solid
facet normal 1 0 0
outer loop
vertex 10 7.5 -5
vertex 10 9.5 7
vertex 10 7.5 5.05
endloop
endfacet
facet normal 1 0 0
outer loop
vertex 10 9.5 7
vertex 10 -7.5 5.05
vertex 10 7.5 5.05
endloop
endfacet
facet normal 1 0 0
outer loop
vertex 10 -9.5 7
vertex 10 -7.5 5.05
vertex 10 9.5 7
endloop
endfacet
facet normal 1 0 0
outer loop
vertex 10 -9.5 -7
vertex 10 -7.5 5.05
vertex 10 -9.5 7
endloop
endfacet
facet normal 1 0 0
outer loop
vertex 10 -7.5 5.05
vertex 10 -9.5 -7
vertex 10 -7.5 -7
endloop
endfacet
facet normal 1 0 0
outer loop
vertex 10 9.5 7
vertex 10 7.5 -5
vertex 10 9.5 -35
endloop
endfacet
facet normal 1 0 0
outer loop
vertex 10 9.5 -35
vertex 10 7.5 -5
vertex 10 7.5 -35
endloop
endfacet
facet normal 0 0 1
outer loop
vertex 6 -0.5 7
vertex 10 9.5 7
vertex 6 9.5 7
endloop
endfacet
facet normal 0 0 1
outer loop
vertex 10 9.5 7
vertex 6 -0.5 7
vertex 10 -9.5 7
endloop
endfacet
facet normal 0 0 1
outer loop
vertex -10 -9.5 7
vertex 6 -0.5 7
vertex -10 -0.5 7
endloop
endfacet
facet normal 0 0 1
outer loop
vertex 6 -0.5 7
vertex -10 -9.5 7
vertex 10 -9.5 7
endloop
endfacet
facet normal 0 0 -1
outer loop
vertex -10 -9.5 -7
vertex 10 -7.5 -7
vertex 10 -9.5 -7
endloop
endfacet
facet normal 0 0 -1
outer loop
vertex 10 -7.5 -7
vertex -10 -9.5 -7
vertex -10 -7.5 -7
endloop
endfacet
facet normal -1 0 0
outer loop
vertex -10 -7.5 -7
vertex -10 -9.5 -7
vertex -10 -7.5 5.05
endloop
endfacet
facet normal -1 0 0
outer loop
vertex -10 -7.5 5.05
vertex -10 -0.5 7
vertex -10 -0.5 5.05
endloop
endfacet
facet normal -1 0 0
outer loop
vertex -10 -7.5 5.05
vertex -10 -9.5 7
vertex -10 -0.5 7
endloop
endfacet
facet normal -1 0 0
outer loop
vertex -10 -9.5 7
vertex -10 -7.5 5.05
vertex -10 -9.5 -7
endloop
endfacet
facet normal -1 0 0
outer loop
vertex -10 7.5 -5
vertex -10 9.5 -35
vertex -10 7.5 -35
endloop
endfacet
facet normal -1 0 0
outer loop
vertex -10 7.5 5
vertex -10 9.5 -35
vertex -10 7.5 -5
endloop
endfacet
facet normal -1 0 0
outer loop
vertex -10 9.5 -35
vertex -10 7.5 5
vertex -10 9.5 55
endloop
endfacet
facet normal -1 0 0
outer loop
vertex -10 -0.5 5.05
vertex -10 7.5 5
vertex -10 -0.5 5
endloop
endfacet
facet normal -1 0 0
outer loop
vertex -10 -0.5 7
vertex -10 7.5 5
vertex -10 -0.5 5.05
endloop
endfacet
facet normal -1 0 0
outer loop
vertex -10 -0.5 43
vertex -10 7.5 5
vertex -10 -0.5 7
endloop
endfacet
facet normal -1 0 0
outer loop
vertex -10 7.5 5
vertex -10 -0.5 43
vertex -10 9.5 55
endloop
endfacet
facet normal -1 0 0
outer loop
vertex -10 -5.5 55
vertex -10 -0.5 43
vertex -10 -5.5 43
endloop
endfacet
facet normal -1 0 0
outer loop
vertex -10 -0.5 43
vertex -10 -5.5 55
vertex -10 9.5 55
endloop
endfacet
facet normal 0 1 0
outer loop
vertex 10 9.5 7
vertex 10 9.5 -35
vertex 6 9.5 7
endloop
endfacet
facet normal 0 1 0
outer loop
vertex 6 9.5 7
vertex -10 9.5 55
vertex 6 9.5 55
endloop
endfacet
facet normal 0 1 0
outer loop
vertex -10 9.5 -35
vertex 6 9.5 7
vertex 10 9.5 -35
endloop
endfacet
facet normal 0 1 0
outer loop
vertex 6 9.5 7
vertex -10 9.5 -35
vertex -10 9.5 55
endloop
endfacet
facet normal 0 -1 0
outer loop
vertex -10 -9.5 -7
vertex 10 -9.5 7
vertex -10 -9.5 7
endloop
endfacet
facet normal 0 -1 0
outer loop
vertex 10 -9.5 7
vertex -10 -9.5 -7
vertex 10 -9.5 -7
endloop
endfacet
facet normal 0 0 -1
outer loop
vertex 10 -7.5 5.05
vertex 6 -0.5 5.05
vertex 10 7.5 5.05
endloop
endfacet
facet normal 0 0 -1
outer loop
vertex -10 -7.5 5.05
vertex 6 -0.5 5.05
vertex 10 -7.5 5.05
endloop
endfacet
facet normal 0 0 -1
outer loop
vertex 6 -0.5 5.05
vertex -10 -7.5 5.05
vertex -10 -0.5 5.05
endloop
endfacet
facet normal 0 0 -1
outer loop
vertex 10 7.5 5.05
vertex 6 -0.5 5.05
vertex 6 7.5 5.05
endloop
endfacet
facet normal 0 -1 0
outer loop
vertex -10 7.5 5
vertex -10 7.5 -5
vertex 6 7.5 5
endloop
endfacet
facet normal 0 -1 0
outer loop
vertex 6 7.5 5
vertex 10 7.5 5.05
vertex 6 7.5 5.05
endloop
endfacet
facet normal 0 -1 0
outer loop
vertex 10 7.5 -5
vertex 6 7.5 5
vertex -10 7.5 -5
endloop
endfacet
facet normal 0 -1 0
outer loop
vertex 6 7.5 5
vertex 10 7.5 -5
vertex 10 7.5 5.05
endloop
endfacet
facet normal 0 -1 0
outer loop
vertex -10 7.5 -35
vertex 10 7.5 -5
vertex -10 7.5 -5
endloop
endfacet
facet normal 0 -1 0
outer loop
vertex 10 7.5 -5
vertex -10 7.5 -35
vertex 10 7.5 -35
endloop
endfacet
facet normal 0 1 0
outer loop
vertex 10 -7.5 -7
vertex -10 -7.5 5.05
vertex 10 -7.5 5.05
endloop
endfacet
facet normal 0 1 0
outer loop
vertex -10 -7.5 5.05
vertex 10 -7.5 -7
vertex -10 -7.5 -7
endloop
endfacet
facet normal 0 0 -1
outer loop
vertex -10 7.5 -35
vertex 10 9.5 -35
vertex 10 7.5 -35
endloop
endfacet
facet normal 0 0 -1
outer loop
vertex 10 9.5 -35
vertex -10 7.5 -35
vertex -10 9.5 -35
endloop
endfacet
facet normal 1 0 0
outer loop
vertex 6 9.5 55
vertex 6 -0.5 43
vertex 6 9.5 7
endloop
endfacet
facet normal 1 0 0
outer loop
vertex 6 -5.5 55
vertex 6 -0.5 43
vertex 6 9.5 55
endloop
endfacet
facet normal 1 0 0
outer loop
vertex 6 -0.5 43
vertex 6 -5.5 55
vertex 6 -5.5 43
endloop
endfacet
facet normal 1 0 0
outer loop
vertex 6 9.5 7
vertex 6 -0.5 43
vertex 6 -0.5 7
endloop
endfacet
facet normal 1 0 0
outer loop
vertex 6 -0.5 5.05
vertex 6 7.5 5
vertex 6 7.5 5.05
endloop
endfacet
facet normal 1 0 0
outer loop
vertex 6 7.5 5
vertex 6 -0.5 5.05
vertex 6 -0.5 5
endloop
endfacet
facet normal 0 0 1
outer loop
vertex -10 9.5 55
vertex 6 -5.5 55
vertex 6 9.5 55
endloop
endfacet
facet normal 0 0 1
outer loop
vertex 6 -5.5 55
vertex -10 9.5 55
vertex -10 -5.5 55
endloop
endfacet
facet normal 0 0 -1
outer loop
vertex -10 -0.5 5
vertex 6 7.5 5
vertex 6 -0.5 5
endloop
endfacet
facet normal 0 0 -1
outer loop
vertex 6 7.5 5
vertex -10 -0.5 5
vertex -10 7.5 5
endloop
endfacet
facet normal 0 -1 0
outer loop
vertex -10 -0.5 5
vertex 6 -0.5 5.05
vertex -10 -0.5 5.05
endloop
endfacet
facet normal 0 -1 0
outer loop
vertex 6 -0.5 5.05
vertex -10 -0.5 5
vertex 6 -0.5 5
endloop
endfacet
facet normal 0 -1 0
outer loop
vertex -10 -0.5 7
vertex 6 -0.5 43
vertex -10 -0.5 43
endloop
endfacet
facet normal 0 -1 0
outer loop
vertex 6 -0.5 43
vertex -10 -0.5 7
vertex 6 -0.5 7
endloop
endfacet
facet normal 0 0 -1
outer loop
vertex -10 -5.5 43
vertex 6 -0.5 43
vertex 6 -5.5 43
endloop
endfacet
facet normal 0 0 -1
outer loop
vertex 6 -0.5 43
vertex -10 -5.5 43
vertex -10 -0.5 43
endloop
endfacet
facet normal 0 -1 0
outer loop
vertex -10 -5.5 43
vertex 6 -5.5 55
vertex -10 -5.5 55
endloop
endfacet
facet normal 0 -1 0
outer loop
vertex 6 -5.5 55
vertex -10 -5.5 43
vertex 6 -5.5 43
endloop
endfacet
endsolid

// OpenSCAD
CUBE_WIDTH = 16;
CUBE_LENGTH = 15;
CUBE_HEIGHT = 12;
CUBE_THICKNESS = 2;

ARM_HEIGHT = 50;
ARM_THICKNESS = 2;

module adapter() {
    // Make female connector
    difference() {
        cube(size = [CUBE_WIDTH + CUBE_THICKNESS * 2, CUBE_LENGTH + CUBE_THICKNESS * 2, CUBE_HEIGHT + CUBE_THICKNESS], center = true);

        translate([0, 0, - CUBE_THICKNESS + 1]) {
            cube(size = [CUBE_WIDTH * 2, CUBE_LENGTH, CUBE_HEIGHT + 0.1], center = true);
        }
    }

    // Make arm
    translate([0, CUBE_WIDTH / 2 + CUBE_THICKNESS / 2 - 0.5, ARM_HEIGHT / 2 + CUBE_HEIGHT / 2 - CUBE_THICKNESS / 2]) {
        %color("RED")    cube(size = [CUBE_WIDTH + CUBE_THICKNESS * 2, ARM_THICKNESS, ARM_HEIGHT], center = true);
    }

    translate([0, CUBE_WIDTH / 2 + CUBE_THICKNESS / 2 - 0.5, -20]) {
        color("RED")
            cube(size = [CUBE_WIDTH + CUBE_THICKNESS * 2, ARM_THICKNESS, 30], center = true);
    }

    translate([- 4 / 2, 4.5, ARM_HEIGHT / 2 + CUBE_HEIGHT / 2 - CUBE_THICKNESS / 2]) {
        color("GREEN")  cube(size = [CUBE_WIDTH, 10, ARM_HEIGHT], center = true);
    }

    // Make male
    translate([- CUBE_THICKNESS, ARM_THICKNESS, ARM_HEIGHT - CUBE_THICKNESS / 2]) {
        cube(size = [CUBE_WIDTH, CUBE_LENGTH, CUBE_HEIGHT], center = true);
    }
}

//rotate([0, -90, 0])
adapter();
